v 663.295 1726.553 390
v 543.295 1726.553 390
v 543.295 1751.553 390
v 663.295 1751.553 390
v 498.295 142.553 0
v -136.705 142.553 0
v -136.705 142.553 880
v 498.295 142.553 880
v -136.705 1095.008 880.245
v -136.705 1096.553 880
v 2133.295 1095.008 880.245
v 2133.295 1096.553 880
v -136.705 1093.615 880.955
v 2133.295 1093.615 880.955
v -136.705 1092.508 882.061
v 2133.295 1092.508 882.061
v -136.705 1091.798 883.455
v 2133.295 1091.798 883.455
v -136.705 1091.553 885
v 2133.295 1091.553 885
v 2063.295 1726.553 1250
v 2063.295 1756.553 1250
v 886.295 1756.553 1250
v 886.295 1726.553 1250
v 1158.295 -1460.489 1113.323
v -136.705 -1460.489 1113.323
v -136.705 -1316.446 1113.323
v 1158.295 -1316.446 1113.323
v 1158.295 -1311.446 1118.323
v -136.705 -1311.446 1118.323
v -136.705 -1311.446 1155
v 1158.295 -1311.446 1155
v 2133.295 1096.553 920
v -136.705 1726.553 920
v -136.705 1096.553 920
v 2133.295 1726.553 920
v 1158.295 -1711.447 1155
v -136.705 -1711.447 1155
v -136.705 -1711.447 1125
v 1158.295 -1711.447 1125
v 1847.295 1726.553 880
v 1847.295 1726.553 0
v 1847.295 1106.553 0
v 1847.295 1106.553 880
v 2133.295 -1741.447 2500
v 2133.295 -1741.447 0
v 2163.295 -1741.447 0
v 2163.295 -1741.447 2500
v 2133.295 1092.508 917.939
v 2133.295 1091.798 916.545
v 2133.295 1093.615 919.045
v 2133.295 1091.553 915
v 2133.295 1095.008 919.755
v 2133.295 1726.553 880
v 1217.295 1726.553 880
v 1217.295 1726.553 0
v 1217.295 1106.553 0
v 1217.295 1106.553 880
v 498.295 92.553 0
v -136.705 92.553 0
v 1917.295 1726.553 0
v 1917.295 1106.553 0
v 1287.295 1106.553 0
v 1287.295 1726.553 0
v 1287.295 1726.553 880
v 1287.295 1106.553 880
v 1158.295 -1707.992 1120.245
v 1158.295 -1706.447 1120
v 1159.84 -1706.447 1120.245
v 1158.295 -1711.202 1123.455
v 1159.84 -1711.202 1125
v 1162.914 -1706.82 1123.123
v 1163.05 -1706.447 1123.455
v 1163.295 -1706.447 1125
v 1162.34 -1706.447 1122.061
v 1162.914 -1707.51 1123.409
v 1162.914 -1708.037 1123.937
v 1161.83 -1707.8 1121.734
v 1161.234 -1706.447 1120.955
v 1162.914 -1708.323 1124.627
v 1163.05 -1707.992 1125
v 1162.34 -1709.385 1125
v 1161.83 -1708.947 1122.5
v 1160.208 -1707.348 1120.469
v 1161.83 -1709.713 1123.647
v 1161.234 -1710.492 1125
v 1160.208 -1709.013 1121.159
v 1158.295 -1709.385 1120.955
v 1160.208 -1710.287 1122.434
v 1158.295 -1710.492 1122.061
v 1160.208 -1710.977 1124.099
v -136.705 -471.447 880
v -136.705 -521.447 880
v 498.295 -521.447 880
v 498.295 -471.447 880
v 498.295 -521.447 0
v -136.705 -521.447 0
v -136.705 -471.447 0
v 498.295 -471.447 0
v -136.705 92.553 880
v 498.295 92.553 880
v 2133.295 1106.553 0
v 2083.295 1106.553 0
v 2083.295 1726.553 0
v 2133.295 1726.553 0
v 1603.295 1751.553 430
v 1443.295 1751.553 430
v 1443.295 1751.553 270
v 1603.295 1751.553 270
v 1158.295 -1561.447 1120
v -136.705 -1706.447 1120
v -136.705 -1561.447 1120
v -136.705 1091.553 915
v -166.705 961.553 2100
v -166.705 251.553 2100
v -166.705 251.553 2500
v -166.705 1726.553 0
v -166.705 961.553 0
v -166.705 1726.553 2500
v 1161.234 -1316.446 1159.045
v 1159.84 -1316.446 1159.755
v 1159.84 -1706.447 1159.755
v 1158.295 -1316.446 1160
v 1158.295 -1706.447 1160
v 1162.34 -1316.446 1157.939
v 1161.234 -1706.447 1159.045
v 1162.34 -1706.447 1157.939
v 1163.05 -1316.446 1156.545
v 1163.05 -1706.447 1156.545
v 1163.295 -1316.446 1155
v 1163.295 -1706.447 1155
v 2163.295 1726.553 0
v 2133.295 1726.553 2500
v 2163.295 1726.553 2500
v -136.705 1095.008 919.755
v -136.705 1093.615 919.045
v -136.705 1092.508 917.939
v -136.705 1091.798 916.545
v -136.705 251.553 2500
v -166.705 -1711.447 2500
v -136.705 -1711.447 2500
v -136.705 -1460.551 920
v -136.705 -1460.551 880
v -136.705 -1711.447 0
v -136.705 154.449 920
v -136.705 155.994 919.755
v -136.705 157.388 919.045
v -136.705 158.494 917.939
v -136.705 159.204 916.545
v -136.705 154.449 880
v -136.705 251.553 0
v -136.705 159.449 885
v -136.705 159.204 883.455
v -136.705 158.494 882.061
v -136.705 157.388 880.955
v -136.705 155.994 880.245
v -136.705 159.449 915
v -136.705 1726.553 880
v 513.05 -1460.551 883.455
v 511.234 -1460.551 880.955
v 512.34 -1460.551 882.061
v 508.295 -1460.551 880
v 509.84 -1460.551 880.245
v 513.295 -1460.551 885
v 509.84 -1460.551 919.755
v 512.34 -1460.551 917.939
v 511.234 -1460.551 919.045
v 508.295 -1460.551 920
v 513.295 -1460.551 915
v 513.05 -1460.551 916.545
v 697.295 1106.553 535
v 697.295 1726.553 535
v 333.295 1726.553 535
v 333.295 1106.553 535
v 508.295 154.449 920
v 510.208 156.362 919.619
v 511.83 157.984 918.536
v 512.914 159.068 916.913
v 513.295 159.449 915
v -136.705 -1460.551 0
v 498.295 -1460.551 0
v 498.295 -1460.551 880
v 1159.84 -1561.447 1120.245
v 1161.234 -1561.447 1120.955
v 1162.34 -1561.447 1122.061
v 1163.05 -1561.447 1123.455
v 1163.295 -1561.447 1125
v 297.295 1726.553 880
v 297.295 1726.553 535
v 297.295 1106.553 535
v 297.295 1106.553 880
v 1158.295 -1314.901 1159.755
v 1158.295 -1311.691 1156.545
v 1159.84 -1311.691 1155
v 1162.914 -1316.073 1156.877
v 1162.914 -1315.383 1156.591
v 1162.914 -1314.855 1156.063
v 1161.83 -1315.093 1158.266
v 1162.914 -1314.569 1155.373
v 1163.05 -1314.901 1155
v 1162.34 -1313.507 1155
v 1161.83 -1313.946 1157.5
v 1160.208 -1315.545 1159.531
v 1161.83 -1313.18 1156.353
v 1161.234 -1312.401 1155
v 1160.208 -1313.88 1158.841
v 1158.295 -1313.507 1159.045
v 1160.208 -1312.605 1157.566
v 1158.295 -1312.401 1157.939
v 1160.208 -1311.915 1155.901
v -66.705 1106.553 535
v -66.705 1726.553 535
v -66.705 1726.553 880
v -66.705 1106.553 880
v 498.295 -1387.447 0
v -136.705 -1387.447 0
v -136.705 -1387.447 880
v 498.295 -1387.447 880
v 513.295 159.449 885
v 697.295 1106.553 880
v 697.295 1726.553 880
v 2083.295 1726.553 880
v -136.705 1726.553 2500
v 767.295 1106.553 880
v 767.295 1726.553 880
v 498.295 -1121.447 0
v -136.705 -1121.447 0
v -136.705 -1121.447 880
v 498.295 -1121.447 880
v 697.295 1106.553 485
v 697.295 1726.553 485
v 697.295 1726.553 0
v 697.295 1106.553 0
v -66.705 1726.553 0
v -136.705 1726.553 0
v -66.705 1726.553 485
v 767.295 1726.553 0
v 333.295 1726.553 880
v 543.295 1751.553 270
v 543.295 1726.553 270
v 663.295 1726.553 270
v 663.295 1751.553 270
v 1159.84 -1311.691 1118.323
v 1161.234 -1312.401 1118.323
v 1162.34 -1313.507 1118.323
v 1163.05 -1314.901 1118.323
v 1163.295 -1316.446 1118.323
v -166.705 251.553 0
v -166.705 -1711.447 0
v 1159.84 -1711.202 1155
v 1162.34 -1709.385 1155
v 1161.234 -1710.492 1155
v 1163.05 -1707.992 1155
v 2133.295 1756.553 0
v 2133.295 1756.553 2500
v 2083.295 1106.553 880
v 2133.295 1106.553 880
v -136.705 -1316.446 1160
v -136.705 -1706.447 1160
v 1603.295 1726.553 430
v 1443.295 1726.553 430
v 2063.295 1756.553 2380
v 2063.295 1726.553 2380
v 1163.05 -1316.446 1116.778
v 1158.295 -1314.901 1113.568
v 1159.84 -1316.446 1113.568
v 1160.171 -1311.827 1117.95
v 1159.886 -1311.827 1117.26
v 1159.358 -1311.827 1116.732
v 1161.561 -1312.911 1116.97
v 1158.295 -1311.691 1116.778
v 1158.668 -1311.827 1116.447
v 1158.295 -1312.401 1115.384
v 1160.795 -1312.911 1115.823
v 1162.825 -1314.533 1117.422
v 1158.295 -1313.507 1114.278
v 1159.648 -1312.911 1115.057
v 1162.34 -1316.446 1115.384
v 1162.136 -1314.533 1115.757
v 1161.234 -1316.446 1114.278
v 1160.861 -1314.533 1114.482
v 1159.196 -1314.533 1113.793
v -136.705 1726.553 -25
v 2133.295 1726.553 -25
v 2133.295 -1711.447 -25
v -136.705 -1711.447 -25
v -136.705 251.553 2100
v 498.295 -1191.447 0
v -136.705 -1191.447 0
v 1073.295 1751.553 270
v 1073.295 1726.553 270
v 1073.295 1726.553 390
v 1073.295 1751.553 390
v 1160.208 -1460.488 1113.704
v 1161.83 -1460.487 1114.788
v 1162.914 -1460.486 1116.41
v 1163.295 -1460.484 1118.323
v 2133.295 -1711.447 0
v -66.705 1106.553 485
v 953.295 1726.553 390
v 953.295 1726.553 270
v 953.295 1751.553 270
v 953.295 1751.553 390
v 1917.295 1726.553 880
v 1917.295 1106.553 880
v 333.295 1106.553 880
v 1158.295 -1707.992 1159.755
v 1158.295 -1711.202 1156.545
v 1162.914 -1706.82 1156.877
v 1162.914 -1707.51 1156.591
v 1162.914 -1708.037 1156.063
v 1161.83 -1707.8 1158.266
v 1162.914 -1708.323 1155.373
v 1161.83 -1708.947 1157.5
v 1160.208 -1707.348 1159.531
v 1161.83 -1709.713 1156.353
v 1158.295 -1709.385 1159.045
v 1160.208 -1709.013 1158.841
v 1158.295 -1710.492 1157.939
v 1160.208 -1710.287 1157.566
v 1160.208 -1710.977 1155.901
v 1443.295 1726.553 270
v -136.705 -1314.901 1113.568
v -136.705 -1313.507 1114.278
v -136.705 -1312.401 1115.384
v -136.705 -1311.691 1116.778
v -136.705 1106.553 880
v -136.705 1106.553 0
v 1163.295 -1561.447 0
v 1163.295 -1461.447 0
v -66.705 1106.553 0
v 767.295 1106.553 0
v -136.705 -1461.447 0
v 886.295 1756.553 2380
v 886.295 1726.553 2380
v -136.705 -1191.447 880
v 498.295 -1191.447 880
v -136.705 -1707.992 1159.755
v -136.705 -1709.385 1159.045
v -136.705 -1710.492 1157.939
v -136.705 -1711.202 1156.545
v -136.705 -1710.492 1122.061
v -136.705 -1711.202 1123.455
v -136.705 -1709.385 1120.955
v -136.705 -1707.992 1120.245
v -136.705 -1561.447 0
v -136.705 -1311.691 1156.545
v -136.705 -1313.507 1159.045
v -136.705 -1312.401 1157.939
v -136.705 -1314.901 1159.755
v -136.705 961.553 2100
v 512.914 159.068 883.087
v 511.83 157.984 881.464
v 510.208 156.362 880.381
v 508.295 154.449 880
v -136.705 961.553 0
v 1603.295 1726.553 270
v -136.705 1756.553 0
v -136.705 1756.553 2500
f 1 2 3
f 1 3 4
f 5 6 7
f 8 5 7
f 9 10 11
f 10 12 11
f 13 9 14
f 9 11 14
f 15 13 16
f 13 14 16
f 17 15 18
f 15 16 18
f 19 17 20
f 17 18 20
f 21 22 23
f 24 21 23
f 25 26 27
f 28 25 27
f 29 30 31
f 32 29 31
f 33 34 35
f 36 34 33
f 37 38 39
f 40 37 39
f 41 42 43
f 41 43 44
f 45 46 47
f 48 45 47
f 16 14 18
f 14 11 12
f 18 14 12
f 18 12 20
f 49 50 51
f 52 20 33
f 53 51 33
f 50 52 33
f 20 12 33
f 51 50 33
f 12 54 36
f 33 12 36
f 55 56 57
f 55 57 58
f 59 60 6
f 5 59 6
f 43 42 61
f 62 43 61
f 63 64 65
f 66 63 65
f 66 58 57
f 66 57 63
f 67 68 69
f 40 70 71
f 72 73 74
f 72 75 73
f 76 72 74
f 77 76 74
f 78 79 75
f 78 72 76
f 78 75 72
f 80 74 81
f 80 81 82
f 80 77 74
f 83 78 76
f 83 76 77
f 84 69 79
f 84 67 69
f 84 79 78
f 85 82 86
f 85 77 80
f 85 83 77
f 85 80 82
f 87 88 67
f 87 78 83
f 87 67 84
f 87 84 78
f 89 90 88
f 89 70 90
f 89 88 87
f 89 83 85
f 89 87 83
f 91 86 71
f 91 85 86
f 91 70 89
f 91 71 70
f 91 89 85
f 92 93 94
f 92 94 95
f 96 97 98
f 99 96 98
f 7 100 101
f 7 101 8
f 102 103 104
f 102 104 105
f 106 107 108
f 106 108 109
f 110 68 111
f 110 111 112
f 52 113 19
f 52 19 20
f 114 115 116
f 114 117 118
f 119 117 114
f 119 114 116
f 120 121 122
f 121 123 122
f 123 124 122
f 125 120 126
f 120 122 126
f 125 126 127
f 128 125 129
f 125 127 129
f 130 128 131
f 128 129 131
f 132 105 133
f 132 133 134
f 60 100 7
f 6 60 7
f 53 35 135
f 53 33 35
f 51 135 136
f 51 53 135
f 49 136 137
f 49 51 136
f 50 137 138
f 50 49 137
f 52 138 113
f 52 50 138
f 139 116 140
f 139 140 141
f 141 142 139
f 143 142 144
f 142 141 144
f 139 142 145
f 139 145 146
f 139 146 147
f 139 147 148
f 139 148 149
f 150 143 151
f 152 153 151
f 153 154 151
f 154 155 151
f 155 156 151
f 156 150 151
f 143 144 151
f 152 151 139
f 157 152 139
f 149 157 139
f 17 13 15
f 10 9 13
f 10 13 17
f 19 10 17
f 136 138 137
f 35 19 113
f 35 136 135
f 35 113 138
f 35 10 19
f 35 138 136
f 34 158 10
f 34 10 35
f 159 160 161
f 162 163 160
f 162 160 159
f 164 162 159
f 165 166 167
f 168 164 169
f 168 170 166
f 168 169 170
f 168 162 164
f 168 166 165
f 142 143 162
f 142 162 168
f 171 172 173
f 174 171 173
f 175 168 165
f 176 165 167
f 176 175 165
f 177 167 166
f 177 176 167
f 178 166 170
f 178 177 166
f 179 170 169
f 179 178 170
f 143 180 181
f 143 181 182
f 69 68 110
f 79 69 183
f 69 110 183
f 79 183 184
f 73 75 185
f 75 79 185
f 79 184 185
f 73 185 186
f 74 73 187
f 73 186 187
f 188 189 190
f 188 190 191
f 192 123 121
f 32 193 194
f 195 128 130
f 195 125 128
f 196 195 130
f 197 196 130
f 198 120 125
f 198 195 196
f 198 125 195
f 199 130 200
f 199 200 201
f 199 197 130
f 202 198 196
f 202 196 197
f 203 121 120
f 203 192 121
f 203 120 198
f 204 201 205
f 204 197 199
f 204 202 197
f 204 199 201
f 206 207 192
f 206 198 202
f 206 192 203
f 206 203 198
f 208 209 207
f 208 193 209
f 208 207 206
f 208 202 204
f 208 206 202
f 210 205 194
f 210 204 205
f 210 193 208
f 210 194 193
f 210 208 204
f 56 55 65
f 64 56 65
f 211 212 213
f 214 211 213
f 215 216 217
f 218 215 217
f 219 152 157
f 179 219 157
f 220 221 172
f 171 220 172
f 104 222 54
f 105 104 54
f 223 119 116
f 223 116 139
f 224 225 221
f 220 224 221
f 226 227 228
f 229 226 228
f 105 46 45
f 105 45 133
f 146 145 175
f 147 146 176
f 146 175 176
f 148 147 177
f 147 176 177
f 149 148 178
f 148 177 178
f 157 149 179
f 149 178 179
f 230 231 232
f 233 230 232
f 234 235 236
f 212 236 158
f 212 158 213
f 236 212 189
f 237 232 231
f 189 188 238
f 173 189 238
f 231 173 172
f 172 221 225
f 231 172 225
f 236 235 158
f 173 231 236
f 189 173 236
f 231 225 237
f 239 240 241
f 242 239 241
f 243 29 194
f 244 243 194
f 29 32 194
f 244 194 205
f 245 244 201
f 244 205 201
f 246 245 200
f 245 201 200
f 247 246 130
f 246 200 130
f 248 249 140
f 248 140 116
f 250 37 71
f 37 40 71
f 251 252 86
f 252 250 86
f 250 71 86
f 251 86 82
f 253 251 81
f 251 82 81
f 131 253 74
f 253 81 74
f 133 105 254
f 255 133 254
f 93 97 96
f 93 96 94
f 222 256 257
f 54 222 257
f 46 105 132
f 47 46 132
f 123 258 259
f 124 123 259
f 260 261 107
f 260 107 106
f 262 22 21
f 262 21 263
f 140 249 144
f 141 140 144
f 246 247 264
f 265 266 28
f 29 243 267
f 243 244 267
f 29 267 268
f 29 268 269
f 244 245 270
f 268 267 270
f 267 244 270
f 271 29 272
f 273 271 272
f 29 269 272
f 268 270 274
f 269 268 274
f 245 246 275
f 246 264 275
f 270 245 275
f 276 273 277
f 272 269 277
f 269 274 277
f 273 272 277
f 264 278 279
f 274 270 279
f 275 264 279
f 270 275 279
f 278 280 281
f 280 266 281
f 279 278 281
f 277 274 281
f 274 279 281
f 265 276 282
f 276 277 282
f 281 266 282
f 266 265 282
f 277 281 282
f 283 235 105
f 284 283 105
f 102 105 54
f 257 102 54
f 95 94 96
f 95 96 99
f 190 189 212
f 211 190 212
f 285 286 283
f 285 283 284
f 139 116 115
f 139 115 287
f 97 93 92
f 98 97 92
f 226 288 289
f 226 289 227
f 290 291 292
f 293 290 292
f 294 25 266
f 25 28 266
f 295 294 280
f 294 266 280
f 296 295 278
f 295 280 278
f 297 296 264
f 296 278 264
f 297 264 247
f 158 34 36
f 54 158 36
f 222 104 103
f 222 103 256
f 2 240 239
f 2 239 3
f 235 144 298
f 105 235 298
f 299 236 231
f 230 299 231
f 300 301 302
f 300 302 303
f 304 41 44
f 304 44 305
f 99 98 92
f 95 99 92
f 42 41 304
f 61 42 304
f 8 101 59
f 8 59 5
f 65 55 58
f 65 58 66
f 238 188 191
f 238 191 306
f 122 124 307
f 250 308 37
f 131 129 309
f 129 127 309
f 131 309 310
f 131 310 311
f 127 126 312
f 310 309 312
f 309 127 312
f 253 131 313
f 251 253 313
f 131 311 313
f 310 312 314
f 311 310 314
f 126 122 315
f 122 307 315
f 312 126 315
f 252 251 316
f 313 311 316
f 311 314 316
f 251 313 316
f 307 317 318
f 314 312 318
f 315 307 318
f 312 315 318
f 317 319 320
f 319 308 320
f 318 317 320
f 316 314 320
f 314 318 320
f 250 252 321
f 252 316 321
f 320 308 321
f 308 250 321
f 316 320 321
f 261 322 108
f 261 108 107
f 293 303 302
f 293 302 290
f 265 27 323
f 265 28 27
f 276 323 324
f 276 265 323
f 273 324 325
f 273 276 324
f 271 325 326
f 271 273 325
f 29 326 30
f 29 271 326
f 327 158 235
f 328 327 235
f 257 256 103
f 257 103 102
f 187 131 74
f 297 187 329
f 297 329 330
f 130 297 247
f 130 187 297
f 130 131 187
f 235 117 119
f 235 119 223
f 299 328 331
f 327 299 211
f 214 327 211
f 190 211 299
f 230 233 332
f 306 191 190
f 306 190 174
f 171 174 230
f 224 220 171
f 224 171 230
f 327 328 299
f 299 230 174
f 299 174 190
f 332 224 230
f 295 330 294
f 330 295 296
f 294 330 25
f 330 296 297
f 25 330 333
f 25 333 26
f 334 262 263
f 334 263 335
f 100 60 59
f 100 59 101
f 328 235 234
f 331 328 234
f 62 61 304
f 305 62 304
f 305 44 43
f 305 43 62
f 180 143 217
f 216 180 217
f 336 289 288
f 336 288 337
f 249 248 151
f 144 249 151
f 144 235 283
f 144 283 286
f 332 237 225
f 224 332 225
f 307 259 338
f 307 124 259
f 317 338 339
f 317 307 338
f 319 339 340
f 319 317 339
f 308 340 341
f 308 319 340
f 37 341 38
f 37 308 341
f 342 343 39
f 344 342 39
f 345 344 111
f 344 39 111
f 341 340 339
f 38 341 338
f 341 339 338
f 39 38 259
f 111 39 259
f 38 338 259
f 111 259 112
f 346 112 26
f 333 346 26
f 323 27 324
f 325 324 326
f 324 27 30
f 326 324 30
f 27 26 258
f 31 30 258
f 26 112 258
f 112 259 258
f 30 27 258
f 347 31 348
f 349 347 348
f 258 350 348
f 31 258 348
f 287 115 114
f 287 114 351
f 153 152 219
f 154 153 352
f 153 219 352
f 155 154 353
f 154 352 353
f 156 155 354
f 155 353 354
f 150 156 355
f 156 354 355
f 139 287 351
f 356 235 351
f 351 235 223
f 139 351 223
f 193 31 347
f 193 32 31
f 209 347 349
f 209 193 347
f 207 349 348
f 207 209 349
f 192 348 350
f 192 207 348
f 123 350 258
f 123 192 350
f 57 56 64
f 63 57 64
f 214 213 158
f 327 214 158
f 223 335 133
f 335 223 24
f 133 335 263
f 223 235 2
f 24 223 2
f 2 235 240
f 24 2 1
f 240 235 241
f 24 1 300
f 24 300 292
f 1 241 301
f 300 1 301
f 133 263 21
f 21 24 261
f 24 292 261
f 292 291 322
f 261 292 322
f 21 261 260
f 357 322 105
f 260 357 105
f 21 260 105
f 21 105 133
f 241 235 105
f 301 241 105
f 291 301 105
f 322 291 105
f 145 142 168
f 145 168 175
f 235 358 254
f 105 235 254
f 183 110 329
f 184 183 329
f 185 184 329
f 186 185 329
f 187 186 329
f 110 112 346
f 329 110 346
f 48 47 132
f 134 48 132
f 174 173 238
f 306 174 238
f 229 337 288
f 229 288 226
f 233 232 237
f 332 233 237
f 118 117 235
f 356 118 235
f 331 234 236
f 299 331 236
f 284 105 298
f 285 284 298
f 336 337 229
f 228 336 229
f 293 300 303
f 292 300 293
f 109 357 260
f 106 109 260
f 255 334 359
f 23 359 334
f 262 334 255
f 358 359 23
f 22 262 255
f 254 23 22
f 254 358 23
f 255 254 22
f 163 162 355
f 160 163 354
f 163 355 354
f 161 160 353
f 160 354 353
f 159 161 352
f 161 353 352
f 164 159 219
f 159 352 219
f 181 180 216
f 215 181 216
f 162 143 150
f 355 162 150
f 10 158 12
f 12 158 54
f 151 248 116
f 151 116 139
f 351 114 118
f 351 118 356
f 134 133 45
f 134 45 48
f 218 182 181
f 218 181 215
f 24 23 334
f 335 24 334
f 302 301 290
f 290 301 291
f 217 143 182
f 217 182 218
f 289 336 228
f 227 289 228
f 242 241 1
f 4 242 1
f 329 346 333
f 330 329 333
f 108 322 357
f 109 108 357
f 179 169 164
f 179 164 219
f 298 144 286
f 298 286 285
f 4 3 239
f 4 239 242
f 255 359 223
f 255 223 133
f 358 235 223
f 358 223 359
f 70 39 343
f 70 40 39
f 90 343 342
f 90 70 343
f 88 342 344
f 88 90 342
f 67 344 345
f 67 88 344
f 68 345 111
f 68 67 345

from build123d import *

# Parameters (mm, degrees)
F0_W      = 2270
F0_H      = 30
F1_DEPTH  = 2500
F0_W_2    = 30
F0_H_2    = 3468
F0_H_3    = 765
F0_H_4    = 1963
F2_W      = 2270
F2_H      = 3438
F3_DEPTH  = 25
F4_W      = 2270
F4_H      = 40
F5_DEPTH  = 635
F7_DEPTH  = 1300
F6_W      = 1620
F6_H      = 40
F8_DEPTH  = 650
F9_W      = 1177
F9_H      = 1130
F10_DEPTH = 3498.001
F11_W     = 30
F11_H     = 400
F12_DEPTH = 710
F13_W     = 70
F13_H     = 880
F14_DEPTH = 635
F13_W_2   = 73.1048560888
F13_W_3   = 50
F15_R     = 5
F16_R     = 5
F17_R     = 5
F18_W     = 50
F18_H     = 880
F19_DEPTH = 620
F18_W_2   = 70
F18_W_3   = 36
F18_H_2   = 345
F4_W_2    = 160
F4_H_2    = 160
F4_W_3    = 120
F4_H_3    = 120
F20_DEPTH = 25


with BuildPart() as f1:
    # F0 (on Top) → F1 (new body)
    with BuildSketch(Plane.XY):
        with Locations((998.2948233199, 1741.5534749776)):
            Rectangle(F0_W, F0_H)
    extrude(amount=F1_DEPTH)

    # F9 (on face) → F10 (cut, through all)
    with BuildSketch(Plane(origin=(0, 1756.5534749776, 0), x_dir=(-1, 0, 0), z_dir=(0, 1, 0))):
        with Locations((-1474.7948233199, 1815)):
            Rectangle(F9_W, F9_H)
    extrude(amount=-F10_DEPTH, mode=Mode.SUBTRACT)

    # F4 (on face) → F20 (cut)
    with BuildSketch(Plane.XZ.offset(-1726.5534749776)):
        with Locations((1523.2948233199, 350)):
            Rectangle(F4_W_2, F4_H_2)
        with Locations((1013.2948233199, 330)):
            Rectangle(F4_W_3, F4_H_3)
        with Locations((603.2948233199, 330)):
            Rectangle(F4_W_3, F4_H_3)
    extrude(amount=-F20_DEPTH, mode=Mode.SUBTRACT)


with BuildPart() as f1b:
    # F0 (on Top) → F1, piece 2 (new body)
    with BuildSketch(Plane.XY):
        with Locations((2148.2948233199, -7.4465250224)):
            Rectangle(F0_W_2, F0_H_2)
    extrude(amount=F1_DEPTH)


with BuildPart() as f1c:
    # F0 (on Top) → F1, piece 3 (new body)
    with BuildSketch(Plane.XY):
        with Locations((-151.7051766801, 1344.0534749776)):
            Rectangle(F0_W_2, F0_H_3)
    extrude(amount=F1_DEPTH)

    # F11 (on face) → F12 (join)
    with BuildSketch(Plane.XZ.offset(-961.5534749776)):
        with Locations((-151.7051766801, 2300)):
            Rectangle(F11_W, F11_H)
    extrude(amount=F12_DEPTH)


with BuildPart() as f1d:
    # F0 (on Top) → F1, piece 4 (new body)
    with BuildSketch(Plane.XY):
        with Locations((-151.7051766801, -729.9465250224)):
            Rectangle(F0_W_2, F0_H_4)
    extrude(amount=F1_DEPTH)

    # F6 (on face) → F8 (join)
    with BuildSketch(Plane.YZ.offset(-136.7051766801)):
        with Locations((-650.5513811111, 900)):
            Rectangle(F6_W, F6_H)
    extrude(amount=F8_DEPTH)

    # F15
    f15_edges = [f1d.edges().sort_by_distance(p)[0] for p in [
        (188.294823, 159.448619, 920),
        (513.294823, -650.551381, 920),
        (188.294823, 159.448619, 880),
        (513.294823, -650.551381, 880),
    ]]
    fillet(f15_edges, radius=F15_R)


with BuildPart() as f3:
    # F2 (on face) → F3 (new body)
    with BuildSketch(Plane(origin=(0, 0, 0), x_dir=(1, 0, 0), z_dir=(0, 0, -1))):
        with Locations((998.2948233199, -7.5534749776)):
            Rectangle(F2_W, F2_H)
    extrude(amount=F3_DEPTH)


with BuildPart() as f5:
    # F4 (on face) → F5 (new body)
    with BuildSketch(Plane.XZ.offset(-1726.5534749776)):
        with Locations((998.2948233199, 900)):
            Rectangle(F4_W, F4_H)
    extrude(amount=F5_DEPTH)

    # F17
    f17_edges = [f5.edges().sort_by_distance(p)[0] for p in [
        (998.294823, 1091.553475, 920),
        (998.294823, 1091.553475, 880),
    ]]
    fillet(f17_edges, radius=F17_R)


with BuildPart() as f7:
    # F6 (on face) → F7 (new body)
    with BuildSketch(Plane.YZ.offset(-136.7051766801)):
        Polygon((-1461.4465250224, 0), (-1460.689416728, 880), (-1460.4886770248, 1113.3232116699), (-1311.446047813, 1113.3232116699), (-1311.446047813, 1160), (-1511.4465250224, 1160), (-1711.4465250224, 1160), (-1711.4465250224, 1120), (-1561.4465250224, 1120), (-1561.4465250224, 0), align=None)
    extrude(amount=F7_DEPTH)

    # F16
    f16_edges = [f7.edges().sort_by_distance(p)[0] for p in [
        (513.294823, -1711.446525, 1160),
        (513.294823, -1311.446048, 1160),
        (1163.294823, -1511.446286, 1160),
        (513.294823, -1711.446525, 1120),
        (1163.294823, -1636.446525, 1120),
        (1163.294823, -1385.967362, 1113.323212),
        (1163.294823, -1711.446525, 1140),
        (1163.294823, -1311.446048, 1136.661606),
        (513.294823, -1311.446048, 1113.323212),
    ]]
    fillet(f16_edges, radius=F16_R)


with BuildPart() as f14:
    # F13 (on face) → F14 (new body)
    with BuildSketch(Plane.YZ.offset(-136.7051766801)):
        with Locations((-1156.4465250224, 440)):
            Rectangle(F13_W, F13_H)
    extrude(amount=F14_DEPTH)


with BuildPart() as f14b:
    # F13 (on face) → F14, piece 2 (new body)
    with BuildSketch(Plane.YZ.offset(-136.7051766801)):
        with Locations((-1423.9989530668, 440)):
            Rectangle(F13_W_2, F13_H)
    extrude(amount=F14_DEPTH)


with BuildPart() as f14c:
    # F13 (on face) → F14, piece 3 (new body)
    with BuildSketch(Plane.YZ.offset(-136.7051766801)):
        with Locations((-496.4465250224, 440)):
            Rectangle(F13_W_3, F13_H)
    extrude(amount=F14_DEPTH)


with BuildPart() as f14d:
    # F13 (on face) → F14, piece 4 (new body)
    with BuildSketch(Plane.YZ.offset(-136.7051766801)):
        with Locations((117.5534749776, 440)):
            Rectangle(F13_W_3, F13_H)
    extrude(amount=F14_DEPTH)


with BuildPart() as f19:
    # F18 (on face) → F19 (new body)
    with BuildSketch(Plane.XZ.offset(-1726.5534749776)):
        with Locations((2108.2948233199, 440)):
            Rectangle(F18_W, F18_H)
    extrude(amount=F19_DEPTH)


with BuildPart() as f19b:
    # F18 (on face) → F19, piece 2 (new body)
    with BuildSketch(Plane.XZ.offset(-1726.5534749776)):
        with Locations((1252.2948233199, 440)):
            Rectangle(F18_W_2, F18_H)
    extrude(amount=F19_DEPTH)


with BuildPart() as f19c:
    # F18 (on face) → F19, piece 3 (new body)
    with BuildSketch(Plane.XZ.offset(-1726.5534749776)):
        Polygon((767.2948233199, 880), (697.2948233199, 880), (697.2948233199, 535), (697.2948233199, 485), (697.2948233199, 0), (767.2948233199, 0), align=None)
        Polygon((697.2948233199, 485), (697.2948233199, 535), (333.2948233199, 535), (297.2948233199, 535), (-66.7051766801, 535), (-66.7051766801, 485), align=None)
        with Locations((315.2948233199, 707.5)):
            Rectangle(F18_W_3, F18_H_2)
        Polygon((-66.7051766801, 470), (-66.7051766801, 485), (-66.7051766801, 535), (-66.7051766801, 880), (-136.7051766801, 880), (-136.7051766801, 0), (-66.7051766801, 0), align=None)
    extrude(amount=F19_DEPTH)


with BuildPart() as f19d:
    # F18 (on face) → F19, piece 4 (new body)
    with BuildSketch(Plane.XZ.offset(-1726.5534749776)):
        with Locations((1882.2948233199, 440)):
            Rectangle(F18_W_2, F18_H)
    extrude(amount=F19_DEPTH)


solid = Compound([f1.part, f1b.part, f1c.part, f1d.part, f3.part, f5.part, f7.part, f14.part, f14b.part, f14c.part, f14d.part, f19.part, f19b.part, f19c.part, f19d.part])
